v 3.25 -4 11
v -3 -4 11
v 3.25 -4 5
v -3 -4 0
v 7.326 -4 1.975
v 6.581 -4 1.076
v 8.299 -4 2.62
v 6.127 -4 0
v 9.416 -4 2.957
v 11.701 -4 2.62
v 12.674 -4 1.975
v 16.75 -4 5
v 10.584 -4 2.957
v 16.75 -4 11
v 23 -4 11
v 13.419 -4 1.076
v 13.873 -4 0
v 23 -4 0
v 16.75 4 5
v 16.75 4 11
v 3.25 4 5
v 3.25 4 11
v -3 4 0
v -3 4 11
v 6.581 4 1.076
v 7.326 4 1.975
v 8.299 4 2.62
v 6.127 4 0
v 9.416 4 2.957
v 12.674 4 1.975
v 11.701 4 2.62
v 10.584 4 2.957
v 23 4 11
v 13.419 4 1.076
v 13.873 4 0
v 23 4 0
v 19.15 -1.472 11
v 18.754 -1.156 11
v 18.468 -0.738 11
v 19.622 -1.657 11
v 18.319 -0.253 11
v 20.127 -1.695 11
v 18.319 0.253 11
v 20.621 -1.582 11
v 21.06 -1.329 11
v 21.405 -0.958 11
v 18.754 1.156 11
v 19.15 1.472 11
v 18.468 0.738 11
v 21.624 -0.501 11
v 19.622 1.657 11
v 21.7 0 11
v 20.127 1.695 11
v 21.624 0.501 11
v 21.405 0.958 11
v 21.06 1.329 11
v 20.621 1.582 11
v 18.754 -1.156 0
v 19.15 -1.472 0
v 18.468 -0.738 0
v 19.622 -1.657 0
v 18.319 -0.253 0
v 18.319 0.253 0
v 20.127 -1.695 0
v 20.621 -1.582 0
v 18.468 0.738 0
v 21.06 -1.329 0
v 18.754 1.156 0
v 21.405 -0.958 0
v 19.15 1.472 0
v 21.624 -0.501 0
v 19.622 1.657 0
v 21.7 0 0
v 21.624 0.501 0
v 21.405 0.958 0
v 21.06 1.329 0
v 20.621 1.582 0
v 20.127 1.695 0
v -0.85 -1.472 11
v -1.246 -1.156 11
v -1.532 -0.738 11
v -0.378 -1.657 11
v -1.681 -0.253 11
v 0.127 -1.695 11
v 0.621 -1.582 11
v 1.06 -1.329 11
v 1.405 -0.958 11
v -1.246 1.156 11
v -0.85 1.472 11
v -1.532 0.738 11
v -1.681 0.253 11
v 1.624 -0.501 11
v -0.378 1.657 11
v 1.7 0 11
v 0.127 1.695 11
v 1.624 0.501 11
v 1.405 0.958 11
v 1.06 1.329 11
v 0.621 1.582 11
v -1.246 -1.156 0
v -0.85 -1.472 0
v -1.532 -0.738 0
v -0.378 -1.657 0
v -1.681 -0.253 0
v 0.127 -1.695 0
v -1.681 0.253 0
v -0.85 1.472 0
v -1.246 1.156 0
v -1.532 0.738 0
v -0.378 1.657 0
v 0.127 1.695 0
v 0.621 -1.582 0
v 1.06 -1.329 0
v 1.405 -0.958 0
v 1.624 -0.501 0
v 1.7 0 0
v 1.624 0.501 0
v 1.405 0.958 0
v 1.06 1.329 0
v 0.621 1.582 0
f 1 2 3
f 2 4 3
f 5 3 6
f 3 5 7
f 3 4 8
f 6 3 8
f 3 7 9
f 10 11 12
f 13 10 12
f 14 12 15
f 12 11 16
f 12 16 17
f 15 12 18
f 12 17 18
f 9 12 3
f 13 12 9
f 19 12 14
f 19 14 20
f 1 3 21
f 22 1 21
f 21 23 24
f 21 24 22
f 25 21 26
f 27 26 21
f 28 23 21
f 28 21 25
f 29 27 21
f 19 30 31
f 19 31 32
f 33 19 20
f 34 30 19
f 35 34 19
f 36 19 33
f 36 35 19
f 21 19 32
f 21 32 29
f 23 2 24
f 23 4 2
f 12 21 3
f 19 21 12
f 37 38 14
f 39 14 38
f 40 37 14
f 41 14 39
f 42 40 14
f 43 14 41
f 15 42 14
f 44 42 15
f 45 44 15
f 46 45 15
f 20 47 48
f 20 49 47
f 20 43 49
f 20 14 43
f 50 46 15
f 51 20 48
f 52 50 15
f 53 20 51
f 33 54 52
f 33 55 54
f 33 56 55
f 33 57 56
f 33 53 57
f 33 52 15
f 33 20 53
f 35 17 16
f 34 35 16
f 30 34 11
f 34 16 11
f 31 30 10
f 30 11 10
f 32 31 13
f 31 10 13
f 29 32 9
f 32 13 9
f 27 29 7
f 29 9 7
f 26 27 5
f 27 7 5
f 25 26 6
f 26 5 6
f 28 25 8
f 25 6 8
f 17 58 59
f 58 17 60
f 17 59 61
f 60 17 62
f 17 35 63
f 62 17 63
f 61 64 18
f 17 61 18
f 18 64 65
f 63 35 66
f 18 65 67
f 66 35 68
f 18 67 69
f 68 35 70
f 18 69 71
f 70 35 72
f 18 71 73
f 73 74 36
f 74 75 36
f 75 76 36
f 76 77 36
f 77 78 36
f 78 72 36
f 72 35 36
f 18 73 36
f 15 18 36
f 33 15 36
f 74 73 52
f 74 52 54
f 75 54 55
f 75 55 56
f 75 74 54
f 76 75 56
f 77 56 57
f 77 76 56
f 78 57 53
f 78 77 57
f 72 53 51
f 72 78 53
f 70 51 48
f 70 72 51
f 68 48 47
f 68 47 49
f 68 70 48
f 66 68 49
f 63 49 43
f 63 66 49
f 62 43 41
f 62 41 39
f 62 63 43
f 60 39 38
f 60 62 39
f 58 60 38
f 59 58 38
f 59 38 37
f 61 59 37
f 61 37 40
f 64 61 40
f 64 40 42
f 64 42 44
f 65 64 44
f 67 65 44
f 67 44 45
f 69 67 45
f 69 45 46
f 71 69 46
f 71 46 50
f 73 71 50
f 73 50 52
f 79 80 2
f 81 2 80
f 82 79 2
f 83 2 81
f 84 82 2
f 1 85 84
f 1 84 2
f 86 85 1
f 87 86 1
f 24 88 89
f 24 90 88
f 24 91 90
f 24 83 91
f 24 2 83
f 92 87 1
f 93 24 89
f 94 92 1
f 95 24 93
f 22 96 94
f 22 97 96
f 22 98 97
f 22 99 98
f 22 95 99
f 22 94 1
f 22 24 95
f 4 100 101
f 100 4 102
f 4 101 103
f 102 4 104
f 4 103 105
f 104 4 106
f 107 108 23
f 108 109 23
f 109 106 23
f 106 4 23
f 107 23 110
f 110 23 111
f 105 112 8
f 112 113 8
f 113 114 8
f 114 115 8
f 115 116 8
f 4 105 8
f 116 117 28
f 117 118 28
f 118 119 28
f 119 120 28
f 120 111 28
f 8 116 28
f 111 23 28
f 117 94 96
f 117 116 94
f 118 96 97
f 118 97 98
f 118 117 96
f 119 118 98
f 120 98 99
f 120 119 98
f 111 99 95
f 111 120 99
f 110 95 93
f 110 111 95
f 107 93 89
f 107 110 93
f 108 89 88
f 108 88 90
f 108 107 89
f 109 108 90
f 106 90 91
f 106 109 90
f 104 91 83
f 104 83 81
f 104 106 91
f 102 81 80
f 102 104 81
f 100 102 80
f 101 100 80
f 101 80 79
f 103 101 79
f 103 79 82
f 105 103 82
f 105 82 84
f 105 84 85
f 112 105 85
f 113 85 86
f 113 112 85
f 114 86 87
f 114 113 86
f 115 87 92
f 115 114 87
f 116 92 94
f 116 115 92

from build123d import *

# Parameters (mm, degrees)
SKETCH_W     = 26
SKETCH_H     = 8
SKETCH_R     = 1.7
PAD_DEPTH    = 5
SKETCH002_R  = 4
POCKET_DEPTH = 8.001
SKETCH003_W  = 6.25
SKETCH003_H  = 8
SKETCH003_R  = 1.7
PAD001_DEPTH = 6


with BuildPart() as part:
    # Sketch → Pad (new body)
    with BuildSketch(Plane.XY):
        with Locations((10, 0)):
            Rectangle(SKETCH_W, SKETCH_H)
        Circle(SKETCH_R, mode=Mode.SUBTRACT)
        with Locations((20, 0)):
            Circle(SKETCH_R, mode=Mode.SUBTRACT)
    extrude(amount=PAD_DEPTH)

    # Sketch002 → Pocket (cut, through all)
    with BuildSketch(Plane.XZ.offset(4)):
        with Locations((10, -1)):
            Circle(SKETCH002_R)
    extrude(amount=-POCKET_DEPTH, mode=Mode.SUBTRACT)

    # Sketch003 → Pad001 (new body)
    with BuildSketch(Plane.XY.offset(5)):
        with Locations((0.125, 0)):
            Rectangle(SKETCH003_W, SKETCH003_H)
        Circle(SKETCH003_R, mode=Mode.SUBTRACT)
        with Locations((19.875, 0)):
            Rectangle(SKETCH003_W, SKETCH003_H)
        with Locations((20, 0)):
            Circle(SKETCH003_R, mode=Mode.SUBTRACT)
    extrude(amount=PAD001_DEPTH)


solid = part.part
